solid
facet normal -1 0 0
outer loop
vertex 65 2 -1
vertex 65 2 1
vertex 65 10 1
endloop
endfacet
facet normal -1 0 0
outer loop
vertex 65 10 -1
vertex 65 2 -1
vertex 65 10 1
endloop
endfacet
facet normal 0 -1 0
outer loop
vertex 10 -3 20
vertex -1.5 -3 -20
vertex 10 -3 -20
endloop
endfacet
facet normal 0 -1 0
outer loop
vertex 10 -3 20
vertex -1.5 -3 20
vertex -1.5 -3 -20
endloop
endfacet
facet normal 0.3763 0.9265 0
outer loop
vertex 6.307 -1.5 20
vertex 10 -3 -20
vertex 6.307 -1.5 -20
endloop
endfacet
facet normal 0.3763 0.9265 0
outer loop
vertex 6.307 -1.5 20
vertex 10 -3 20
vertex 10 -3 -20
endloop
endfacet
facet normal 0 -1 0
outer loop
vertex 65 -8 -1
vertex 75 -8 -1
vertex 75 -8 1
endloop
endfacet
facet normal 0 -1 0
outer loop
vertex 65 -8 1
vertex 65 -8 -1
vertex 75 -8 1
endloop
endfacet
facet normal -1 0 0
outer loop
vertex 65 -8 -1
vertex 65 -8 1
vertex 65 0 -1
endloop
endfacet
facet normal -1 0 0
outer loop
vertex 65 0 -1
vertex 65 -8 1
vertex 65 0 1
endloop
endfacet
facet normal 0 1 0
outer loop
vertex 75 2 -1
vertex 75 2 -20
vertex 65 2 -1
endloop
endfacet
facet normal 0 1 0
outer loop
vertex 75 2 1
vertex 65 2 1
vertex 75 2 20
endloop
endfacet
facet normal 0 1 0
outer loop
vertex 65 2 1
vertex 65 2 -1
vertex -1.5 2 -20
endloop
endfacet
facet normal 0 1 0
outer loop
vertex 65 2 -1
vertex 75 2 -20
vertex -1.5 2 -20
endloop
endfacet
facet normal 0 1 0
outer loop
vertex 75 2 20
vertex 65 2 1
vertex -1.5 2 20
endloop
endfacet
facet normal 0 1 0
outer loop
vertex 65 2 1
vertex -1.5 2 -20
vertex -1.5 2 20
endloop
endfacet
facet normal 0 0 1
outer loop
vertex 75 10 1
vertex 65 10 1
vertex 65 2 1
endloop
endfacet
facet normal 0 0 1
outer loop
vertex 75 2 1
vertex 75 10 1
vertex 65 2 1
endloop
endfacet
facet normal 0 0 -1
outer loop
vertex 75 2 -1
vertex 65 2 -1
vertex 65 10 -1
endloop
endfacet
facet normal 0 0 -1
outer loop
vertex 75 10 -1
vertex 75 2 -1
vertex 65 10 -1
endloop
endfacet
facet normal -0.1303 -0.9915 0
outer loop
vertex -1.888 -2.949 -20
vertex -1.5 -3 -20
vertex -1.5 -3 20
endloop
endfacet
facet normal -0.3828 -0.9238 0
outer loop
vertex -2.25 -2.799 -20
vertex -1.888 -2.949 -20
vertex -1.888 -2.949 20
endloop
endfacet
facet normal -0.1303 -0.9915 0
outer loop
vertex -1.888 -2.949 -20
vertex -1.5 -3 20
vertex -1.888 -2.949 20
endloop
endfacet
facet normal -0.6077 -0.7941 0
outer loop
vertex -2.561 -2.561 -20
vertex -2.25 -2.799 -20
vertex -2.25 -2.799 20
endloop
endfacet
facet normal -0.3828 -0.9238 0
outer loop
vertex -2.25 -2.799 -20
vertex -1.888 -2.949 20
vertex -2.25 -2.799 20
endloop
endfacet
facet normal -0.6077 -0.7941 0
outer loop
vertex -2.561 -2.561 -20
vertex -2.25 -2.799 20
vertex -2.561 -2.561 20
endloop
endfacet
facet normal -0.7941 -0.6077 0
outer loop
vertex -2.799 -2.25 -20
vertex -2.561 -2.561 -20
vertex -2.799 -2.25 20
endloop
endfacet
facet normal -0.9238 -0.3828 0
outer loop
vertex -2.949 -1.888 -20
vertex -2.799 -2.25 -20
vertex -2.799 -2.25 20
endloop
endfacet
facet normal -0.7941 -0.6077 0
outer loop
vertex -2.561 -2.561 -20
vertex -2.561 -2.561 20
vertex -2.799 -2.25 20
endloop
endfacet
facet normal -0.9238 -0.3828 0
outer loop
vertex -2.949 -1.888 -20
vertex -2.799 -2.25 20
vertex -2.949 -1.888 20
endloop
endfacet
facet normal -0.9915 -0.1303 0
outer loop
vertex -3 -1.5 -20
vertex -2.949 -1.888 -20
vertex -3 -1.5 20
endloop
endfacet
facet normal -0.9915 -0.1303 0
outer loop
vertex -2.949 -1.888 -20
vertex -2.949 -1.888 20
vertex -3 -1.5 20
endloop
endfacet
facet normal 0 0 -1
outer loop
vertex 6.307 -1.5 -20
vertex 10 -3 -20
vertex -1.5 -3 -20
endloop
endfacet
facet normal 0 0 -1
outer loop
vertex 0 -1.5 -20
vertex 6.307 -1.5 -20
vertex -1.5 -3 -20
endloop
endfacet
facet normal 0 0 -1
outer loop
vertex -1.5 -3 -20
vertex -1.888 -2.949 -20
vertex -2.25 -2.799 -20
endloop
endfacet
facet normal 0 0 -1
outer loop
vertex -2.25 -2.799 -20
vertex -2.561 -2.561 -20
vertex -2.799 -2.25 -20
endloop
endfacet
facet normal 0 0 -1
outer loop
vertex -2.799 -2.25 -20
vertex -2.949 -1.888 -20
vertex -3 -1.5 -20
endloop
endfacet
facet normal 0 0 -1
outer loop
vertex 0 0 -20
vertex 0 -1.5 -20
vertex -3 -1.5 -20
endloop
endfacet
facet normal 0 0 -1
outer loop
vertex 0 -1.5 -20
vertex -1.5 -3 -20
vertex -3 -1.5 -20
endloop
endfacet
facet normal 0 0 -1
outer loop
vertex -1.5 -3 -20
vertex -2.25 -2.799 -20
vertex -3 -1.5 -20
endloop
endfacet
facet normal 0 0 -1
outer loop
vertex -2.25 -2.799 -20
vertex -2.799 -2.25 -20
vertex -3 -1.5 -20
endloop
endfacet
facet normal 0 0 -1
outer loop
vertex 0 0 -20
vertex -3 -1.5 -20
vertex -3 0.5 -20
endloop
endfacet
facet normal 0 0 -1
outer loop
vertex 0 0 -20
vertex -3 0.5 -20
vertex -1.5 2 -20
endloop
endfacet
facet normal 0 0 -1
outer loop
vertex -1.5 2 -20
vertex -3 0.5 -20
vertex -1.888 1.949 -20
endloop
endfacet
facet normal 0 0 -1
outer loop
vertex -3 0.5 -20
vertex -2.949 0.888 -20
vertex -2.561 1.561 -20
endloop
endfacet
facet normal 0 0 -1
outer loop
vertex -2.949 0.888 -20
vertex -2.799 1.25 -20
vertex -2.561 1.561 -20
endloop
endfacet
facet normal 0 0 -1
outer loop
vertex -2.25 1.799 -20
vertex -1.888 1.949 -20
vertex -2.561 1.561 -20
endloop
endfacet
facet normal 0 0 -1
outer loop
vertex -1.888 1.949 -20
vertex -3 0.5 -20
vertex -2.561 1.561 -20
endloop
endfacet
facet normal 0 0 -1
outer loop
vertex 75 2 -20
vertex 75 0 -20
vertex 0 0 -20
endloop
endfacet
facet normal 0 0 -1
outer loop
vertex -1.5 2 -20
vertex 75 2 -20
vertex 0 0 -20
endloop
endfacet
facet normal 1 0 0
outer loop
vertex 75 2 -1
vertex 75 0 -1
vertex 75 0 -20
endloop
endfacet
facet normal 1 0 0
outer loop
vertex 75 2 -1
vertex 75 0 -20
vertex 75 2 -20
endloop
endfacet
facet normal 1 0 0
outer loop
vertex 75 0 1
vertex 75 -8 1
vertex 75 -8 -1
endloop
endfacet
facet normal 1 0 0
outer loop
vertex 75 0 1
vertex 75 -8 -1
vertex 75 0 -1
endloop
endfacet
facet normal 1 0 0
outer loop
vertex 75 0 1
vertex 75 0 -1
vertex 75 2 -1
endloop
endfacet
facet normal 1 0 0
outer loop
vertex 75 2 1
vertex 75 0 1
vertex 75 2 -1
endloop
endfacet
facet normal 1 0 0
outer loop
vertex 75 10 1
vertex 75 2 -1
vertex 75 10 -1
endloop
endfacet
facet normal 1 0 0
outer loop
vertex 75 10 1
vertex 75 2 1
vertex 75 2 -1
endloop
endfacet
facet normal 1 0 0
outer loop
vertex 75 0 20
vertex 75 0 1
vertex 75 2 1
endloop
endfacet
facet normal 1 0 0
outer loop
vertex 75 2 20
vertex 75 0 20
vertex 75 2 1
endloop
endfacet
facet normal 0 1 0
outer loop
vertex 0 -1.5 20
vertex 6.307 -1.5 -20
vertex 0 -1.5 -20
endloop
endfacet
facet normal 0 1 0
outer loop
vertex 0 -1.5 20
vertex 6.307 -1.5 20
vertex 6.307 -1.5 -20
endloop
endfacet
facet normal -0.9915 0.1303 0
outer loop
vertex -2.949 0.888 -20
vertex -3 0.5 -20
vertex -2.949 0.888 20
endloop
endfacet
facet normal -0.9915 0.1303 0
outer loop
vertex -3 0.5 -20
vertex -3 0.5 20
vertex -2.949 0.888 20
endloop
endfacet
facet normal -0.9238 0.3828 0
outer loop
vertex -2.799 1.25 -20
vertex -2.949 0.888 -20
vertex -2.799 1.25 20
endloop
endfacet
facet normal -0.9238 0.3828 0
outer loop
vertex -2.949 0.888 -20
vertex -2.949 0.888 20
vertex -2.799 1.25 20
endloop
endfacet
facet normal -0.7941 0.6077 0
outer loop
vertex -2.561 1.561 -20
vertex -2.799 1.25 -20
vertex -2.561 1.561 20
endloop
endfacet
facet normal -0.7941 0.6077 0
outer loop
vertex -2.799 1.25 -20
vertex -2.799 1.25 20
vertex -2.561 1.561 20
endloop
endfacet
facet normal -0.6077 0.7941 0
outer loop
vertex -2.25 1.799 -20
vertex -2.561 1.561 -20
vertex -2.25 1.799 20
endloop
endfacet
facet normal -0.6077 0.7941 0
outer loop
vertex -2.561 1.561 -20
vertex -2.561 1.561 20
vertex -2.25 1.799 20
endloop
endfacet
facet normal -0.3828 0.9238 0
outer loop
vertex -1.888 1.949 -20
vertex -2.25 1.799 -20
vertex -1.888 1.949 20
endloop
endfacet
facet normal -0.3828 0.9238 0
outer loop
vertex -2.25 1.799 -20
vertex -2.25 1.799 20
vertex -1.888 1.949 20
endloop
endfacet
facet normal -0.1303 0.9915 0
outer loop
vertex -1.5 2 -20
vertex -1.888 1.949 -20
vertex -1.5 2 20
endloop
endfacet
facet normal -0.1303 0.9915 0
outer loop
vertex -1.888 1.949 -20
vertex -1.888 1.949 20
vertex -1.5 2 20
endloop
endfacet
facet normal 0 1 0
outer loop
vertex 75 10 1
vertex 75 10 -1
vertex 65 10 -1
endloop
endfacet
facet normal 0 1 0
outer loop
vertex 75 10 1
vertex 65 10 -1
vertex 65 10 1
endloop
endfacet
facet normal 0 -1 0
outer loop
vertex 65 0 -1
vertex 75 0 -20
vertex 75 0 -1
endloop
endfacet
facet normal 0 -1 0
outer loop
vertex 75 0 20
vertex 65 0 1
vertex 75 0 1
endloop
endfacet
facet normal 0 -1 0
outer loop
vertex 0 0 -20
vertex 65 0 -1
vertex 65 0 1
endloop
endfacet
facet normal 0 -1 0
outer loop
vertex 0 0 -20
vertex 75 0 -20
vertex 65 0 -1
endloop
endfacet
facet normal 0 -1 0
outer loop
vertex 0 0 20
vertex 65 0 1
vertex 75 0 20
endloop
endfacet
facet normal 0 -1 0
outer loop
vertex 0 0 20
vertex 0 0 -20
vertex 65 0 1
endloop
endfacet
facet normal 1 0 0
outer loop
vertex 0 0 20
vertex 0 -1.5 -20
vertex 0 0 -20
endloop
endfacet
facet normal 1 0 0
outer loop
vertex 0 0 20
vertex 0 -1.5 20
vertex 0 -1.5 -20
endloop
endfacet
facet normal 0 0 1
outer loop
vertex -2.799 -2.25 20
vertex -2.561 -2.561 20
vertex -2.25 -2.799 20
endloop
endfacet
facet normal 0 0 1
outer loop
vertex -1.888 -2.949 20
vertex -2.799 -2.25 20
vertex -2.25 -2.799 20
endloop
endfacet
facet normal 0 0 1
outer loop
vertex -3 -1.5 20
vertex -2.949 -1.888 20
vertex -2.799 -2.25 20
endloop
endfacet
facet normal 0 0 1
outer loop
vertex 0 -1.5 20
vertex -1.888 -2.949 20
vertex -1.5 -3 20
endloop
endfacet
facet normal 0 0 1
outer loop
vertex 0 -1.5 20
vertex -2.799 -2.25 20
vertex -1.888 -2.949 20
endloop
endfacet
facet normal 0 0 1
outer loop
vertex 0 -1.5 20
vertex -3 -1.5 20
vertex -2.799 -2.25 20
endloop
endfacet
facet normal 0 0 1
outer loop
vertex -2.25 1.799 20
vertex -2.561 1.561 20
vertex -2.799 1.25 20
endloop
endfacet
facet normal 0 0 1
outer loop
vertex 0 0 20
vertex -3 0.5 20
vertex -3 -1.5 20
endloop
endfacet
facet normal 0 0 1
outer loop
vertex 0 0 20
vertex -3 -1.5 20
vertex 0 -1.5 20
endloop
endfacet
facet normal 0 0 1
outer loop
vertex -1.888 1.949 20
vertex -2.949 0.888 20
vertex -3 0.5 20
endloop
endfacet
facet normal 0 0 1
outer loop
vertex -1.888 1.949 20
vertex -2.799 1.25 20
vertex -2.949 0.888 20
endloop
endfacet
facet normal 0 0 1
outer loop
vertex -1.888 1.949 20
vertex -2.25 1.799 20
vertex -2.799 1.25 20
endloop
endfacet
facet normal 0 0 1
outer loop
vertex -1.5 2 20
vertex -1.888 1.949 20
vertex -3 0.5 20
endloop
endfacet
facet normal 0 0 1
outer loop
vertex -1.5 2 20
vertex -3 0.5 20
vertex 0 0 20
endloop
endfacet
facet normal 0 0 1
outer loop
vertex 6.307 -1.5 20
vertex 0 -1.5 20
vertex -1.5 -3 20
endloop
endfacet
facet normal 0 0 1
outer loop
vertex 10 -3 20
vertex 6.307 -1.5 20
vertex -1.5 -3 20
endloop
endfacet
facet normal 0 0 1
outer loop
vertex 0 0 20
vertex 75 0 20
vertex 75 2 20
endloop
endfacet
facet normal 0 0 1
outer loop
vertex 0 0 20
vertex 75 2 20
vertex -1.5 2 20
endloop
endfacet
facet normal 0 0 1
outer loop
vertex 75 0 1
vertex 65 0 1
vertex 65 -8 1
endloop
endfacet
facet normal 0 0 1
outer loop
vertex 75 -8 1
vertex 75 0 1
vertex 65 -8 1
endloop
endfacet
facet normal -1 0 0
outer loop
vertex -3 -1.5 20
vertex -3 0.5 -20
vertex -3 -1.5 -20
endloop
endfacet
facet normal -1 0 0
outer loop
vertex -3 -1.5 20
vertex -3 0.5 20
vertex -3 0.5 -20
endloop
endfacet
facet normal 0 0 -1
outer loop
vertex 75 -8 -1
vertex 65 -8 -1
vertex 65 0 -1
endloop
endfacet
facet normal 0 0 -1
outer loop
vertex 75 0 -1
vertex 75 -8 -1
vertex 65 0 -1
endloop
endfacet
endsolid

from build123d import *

# Parameters (mm, degrees)
F1_DEPTH = 20
F2_W     = 2
F2_H     = 18.9999999525
F2_W_2   = 8
F2_H_2   = 2
F2_H_3   = 19.0000000475
F3_DEPTH = 10
F4_R     = 1.5


with BuildPart() as f1:
    # F0 (on Top) → F1 (new body, symmetric)
    with BuildSketch(Plane.XY):
        Polygon((0, -1.5), (0, 0), (65, 0), (65, 2), (-3, 2), (-3, -3), (10, -3), (6.3068126328, -1.5), align=None)
    extrude(amount=F1_DEPTH, both=True)

    # F2 (on face) → F3 (join)
    with BuildSketch(Plane.YZ.offset(65)):
        with Locations((1, -10.5000000237)):
            Rectangle(F2_W, F2_H)
        with Locations((-4, -4.75e-08)):
            Rectangle(F2_W_2, F2_H_2)
        with Locations((1, -4.75e-08)):
            Rectangle(F2_W, F2_H_2)
        with Locations((6, -4.75e-08)):
            Rectangle(F2_W_2, F2_H_2)
        with Locations((1, 10.4999999763)):
            Rectangle(F2_W, F2_H_3)
    extrude(amount=F3_DEPTH)

    # F4
    f4_edges = [f1.edges().sort_by_distance(p)[0] for p in [
        (-3, -3, 0),
        (-3, 2, 0),
    ]]
    fillet(f4_edges, radius=F4_R)


solid = f1.part
